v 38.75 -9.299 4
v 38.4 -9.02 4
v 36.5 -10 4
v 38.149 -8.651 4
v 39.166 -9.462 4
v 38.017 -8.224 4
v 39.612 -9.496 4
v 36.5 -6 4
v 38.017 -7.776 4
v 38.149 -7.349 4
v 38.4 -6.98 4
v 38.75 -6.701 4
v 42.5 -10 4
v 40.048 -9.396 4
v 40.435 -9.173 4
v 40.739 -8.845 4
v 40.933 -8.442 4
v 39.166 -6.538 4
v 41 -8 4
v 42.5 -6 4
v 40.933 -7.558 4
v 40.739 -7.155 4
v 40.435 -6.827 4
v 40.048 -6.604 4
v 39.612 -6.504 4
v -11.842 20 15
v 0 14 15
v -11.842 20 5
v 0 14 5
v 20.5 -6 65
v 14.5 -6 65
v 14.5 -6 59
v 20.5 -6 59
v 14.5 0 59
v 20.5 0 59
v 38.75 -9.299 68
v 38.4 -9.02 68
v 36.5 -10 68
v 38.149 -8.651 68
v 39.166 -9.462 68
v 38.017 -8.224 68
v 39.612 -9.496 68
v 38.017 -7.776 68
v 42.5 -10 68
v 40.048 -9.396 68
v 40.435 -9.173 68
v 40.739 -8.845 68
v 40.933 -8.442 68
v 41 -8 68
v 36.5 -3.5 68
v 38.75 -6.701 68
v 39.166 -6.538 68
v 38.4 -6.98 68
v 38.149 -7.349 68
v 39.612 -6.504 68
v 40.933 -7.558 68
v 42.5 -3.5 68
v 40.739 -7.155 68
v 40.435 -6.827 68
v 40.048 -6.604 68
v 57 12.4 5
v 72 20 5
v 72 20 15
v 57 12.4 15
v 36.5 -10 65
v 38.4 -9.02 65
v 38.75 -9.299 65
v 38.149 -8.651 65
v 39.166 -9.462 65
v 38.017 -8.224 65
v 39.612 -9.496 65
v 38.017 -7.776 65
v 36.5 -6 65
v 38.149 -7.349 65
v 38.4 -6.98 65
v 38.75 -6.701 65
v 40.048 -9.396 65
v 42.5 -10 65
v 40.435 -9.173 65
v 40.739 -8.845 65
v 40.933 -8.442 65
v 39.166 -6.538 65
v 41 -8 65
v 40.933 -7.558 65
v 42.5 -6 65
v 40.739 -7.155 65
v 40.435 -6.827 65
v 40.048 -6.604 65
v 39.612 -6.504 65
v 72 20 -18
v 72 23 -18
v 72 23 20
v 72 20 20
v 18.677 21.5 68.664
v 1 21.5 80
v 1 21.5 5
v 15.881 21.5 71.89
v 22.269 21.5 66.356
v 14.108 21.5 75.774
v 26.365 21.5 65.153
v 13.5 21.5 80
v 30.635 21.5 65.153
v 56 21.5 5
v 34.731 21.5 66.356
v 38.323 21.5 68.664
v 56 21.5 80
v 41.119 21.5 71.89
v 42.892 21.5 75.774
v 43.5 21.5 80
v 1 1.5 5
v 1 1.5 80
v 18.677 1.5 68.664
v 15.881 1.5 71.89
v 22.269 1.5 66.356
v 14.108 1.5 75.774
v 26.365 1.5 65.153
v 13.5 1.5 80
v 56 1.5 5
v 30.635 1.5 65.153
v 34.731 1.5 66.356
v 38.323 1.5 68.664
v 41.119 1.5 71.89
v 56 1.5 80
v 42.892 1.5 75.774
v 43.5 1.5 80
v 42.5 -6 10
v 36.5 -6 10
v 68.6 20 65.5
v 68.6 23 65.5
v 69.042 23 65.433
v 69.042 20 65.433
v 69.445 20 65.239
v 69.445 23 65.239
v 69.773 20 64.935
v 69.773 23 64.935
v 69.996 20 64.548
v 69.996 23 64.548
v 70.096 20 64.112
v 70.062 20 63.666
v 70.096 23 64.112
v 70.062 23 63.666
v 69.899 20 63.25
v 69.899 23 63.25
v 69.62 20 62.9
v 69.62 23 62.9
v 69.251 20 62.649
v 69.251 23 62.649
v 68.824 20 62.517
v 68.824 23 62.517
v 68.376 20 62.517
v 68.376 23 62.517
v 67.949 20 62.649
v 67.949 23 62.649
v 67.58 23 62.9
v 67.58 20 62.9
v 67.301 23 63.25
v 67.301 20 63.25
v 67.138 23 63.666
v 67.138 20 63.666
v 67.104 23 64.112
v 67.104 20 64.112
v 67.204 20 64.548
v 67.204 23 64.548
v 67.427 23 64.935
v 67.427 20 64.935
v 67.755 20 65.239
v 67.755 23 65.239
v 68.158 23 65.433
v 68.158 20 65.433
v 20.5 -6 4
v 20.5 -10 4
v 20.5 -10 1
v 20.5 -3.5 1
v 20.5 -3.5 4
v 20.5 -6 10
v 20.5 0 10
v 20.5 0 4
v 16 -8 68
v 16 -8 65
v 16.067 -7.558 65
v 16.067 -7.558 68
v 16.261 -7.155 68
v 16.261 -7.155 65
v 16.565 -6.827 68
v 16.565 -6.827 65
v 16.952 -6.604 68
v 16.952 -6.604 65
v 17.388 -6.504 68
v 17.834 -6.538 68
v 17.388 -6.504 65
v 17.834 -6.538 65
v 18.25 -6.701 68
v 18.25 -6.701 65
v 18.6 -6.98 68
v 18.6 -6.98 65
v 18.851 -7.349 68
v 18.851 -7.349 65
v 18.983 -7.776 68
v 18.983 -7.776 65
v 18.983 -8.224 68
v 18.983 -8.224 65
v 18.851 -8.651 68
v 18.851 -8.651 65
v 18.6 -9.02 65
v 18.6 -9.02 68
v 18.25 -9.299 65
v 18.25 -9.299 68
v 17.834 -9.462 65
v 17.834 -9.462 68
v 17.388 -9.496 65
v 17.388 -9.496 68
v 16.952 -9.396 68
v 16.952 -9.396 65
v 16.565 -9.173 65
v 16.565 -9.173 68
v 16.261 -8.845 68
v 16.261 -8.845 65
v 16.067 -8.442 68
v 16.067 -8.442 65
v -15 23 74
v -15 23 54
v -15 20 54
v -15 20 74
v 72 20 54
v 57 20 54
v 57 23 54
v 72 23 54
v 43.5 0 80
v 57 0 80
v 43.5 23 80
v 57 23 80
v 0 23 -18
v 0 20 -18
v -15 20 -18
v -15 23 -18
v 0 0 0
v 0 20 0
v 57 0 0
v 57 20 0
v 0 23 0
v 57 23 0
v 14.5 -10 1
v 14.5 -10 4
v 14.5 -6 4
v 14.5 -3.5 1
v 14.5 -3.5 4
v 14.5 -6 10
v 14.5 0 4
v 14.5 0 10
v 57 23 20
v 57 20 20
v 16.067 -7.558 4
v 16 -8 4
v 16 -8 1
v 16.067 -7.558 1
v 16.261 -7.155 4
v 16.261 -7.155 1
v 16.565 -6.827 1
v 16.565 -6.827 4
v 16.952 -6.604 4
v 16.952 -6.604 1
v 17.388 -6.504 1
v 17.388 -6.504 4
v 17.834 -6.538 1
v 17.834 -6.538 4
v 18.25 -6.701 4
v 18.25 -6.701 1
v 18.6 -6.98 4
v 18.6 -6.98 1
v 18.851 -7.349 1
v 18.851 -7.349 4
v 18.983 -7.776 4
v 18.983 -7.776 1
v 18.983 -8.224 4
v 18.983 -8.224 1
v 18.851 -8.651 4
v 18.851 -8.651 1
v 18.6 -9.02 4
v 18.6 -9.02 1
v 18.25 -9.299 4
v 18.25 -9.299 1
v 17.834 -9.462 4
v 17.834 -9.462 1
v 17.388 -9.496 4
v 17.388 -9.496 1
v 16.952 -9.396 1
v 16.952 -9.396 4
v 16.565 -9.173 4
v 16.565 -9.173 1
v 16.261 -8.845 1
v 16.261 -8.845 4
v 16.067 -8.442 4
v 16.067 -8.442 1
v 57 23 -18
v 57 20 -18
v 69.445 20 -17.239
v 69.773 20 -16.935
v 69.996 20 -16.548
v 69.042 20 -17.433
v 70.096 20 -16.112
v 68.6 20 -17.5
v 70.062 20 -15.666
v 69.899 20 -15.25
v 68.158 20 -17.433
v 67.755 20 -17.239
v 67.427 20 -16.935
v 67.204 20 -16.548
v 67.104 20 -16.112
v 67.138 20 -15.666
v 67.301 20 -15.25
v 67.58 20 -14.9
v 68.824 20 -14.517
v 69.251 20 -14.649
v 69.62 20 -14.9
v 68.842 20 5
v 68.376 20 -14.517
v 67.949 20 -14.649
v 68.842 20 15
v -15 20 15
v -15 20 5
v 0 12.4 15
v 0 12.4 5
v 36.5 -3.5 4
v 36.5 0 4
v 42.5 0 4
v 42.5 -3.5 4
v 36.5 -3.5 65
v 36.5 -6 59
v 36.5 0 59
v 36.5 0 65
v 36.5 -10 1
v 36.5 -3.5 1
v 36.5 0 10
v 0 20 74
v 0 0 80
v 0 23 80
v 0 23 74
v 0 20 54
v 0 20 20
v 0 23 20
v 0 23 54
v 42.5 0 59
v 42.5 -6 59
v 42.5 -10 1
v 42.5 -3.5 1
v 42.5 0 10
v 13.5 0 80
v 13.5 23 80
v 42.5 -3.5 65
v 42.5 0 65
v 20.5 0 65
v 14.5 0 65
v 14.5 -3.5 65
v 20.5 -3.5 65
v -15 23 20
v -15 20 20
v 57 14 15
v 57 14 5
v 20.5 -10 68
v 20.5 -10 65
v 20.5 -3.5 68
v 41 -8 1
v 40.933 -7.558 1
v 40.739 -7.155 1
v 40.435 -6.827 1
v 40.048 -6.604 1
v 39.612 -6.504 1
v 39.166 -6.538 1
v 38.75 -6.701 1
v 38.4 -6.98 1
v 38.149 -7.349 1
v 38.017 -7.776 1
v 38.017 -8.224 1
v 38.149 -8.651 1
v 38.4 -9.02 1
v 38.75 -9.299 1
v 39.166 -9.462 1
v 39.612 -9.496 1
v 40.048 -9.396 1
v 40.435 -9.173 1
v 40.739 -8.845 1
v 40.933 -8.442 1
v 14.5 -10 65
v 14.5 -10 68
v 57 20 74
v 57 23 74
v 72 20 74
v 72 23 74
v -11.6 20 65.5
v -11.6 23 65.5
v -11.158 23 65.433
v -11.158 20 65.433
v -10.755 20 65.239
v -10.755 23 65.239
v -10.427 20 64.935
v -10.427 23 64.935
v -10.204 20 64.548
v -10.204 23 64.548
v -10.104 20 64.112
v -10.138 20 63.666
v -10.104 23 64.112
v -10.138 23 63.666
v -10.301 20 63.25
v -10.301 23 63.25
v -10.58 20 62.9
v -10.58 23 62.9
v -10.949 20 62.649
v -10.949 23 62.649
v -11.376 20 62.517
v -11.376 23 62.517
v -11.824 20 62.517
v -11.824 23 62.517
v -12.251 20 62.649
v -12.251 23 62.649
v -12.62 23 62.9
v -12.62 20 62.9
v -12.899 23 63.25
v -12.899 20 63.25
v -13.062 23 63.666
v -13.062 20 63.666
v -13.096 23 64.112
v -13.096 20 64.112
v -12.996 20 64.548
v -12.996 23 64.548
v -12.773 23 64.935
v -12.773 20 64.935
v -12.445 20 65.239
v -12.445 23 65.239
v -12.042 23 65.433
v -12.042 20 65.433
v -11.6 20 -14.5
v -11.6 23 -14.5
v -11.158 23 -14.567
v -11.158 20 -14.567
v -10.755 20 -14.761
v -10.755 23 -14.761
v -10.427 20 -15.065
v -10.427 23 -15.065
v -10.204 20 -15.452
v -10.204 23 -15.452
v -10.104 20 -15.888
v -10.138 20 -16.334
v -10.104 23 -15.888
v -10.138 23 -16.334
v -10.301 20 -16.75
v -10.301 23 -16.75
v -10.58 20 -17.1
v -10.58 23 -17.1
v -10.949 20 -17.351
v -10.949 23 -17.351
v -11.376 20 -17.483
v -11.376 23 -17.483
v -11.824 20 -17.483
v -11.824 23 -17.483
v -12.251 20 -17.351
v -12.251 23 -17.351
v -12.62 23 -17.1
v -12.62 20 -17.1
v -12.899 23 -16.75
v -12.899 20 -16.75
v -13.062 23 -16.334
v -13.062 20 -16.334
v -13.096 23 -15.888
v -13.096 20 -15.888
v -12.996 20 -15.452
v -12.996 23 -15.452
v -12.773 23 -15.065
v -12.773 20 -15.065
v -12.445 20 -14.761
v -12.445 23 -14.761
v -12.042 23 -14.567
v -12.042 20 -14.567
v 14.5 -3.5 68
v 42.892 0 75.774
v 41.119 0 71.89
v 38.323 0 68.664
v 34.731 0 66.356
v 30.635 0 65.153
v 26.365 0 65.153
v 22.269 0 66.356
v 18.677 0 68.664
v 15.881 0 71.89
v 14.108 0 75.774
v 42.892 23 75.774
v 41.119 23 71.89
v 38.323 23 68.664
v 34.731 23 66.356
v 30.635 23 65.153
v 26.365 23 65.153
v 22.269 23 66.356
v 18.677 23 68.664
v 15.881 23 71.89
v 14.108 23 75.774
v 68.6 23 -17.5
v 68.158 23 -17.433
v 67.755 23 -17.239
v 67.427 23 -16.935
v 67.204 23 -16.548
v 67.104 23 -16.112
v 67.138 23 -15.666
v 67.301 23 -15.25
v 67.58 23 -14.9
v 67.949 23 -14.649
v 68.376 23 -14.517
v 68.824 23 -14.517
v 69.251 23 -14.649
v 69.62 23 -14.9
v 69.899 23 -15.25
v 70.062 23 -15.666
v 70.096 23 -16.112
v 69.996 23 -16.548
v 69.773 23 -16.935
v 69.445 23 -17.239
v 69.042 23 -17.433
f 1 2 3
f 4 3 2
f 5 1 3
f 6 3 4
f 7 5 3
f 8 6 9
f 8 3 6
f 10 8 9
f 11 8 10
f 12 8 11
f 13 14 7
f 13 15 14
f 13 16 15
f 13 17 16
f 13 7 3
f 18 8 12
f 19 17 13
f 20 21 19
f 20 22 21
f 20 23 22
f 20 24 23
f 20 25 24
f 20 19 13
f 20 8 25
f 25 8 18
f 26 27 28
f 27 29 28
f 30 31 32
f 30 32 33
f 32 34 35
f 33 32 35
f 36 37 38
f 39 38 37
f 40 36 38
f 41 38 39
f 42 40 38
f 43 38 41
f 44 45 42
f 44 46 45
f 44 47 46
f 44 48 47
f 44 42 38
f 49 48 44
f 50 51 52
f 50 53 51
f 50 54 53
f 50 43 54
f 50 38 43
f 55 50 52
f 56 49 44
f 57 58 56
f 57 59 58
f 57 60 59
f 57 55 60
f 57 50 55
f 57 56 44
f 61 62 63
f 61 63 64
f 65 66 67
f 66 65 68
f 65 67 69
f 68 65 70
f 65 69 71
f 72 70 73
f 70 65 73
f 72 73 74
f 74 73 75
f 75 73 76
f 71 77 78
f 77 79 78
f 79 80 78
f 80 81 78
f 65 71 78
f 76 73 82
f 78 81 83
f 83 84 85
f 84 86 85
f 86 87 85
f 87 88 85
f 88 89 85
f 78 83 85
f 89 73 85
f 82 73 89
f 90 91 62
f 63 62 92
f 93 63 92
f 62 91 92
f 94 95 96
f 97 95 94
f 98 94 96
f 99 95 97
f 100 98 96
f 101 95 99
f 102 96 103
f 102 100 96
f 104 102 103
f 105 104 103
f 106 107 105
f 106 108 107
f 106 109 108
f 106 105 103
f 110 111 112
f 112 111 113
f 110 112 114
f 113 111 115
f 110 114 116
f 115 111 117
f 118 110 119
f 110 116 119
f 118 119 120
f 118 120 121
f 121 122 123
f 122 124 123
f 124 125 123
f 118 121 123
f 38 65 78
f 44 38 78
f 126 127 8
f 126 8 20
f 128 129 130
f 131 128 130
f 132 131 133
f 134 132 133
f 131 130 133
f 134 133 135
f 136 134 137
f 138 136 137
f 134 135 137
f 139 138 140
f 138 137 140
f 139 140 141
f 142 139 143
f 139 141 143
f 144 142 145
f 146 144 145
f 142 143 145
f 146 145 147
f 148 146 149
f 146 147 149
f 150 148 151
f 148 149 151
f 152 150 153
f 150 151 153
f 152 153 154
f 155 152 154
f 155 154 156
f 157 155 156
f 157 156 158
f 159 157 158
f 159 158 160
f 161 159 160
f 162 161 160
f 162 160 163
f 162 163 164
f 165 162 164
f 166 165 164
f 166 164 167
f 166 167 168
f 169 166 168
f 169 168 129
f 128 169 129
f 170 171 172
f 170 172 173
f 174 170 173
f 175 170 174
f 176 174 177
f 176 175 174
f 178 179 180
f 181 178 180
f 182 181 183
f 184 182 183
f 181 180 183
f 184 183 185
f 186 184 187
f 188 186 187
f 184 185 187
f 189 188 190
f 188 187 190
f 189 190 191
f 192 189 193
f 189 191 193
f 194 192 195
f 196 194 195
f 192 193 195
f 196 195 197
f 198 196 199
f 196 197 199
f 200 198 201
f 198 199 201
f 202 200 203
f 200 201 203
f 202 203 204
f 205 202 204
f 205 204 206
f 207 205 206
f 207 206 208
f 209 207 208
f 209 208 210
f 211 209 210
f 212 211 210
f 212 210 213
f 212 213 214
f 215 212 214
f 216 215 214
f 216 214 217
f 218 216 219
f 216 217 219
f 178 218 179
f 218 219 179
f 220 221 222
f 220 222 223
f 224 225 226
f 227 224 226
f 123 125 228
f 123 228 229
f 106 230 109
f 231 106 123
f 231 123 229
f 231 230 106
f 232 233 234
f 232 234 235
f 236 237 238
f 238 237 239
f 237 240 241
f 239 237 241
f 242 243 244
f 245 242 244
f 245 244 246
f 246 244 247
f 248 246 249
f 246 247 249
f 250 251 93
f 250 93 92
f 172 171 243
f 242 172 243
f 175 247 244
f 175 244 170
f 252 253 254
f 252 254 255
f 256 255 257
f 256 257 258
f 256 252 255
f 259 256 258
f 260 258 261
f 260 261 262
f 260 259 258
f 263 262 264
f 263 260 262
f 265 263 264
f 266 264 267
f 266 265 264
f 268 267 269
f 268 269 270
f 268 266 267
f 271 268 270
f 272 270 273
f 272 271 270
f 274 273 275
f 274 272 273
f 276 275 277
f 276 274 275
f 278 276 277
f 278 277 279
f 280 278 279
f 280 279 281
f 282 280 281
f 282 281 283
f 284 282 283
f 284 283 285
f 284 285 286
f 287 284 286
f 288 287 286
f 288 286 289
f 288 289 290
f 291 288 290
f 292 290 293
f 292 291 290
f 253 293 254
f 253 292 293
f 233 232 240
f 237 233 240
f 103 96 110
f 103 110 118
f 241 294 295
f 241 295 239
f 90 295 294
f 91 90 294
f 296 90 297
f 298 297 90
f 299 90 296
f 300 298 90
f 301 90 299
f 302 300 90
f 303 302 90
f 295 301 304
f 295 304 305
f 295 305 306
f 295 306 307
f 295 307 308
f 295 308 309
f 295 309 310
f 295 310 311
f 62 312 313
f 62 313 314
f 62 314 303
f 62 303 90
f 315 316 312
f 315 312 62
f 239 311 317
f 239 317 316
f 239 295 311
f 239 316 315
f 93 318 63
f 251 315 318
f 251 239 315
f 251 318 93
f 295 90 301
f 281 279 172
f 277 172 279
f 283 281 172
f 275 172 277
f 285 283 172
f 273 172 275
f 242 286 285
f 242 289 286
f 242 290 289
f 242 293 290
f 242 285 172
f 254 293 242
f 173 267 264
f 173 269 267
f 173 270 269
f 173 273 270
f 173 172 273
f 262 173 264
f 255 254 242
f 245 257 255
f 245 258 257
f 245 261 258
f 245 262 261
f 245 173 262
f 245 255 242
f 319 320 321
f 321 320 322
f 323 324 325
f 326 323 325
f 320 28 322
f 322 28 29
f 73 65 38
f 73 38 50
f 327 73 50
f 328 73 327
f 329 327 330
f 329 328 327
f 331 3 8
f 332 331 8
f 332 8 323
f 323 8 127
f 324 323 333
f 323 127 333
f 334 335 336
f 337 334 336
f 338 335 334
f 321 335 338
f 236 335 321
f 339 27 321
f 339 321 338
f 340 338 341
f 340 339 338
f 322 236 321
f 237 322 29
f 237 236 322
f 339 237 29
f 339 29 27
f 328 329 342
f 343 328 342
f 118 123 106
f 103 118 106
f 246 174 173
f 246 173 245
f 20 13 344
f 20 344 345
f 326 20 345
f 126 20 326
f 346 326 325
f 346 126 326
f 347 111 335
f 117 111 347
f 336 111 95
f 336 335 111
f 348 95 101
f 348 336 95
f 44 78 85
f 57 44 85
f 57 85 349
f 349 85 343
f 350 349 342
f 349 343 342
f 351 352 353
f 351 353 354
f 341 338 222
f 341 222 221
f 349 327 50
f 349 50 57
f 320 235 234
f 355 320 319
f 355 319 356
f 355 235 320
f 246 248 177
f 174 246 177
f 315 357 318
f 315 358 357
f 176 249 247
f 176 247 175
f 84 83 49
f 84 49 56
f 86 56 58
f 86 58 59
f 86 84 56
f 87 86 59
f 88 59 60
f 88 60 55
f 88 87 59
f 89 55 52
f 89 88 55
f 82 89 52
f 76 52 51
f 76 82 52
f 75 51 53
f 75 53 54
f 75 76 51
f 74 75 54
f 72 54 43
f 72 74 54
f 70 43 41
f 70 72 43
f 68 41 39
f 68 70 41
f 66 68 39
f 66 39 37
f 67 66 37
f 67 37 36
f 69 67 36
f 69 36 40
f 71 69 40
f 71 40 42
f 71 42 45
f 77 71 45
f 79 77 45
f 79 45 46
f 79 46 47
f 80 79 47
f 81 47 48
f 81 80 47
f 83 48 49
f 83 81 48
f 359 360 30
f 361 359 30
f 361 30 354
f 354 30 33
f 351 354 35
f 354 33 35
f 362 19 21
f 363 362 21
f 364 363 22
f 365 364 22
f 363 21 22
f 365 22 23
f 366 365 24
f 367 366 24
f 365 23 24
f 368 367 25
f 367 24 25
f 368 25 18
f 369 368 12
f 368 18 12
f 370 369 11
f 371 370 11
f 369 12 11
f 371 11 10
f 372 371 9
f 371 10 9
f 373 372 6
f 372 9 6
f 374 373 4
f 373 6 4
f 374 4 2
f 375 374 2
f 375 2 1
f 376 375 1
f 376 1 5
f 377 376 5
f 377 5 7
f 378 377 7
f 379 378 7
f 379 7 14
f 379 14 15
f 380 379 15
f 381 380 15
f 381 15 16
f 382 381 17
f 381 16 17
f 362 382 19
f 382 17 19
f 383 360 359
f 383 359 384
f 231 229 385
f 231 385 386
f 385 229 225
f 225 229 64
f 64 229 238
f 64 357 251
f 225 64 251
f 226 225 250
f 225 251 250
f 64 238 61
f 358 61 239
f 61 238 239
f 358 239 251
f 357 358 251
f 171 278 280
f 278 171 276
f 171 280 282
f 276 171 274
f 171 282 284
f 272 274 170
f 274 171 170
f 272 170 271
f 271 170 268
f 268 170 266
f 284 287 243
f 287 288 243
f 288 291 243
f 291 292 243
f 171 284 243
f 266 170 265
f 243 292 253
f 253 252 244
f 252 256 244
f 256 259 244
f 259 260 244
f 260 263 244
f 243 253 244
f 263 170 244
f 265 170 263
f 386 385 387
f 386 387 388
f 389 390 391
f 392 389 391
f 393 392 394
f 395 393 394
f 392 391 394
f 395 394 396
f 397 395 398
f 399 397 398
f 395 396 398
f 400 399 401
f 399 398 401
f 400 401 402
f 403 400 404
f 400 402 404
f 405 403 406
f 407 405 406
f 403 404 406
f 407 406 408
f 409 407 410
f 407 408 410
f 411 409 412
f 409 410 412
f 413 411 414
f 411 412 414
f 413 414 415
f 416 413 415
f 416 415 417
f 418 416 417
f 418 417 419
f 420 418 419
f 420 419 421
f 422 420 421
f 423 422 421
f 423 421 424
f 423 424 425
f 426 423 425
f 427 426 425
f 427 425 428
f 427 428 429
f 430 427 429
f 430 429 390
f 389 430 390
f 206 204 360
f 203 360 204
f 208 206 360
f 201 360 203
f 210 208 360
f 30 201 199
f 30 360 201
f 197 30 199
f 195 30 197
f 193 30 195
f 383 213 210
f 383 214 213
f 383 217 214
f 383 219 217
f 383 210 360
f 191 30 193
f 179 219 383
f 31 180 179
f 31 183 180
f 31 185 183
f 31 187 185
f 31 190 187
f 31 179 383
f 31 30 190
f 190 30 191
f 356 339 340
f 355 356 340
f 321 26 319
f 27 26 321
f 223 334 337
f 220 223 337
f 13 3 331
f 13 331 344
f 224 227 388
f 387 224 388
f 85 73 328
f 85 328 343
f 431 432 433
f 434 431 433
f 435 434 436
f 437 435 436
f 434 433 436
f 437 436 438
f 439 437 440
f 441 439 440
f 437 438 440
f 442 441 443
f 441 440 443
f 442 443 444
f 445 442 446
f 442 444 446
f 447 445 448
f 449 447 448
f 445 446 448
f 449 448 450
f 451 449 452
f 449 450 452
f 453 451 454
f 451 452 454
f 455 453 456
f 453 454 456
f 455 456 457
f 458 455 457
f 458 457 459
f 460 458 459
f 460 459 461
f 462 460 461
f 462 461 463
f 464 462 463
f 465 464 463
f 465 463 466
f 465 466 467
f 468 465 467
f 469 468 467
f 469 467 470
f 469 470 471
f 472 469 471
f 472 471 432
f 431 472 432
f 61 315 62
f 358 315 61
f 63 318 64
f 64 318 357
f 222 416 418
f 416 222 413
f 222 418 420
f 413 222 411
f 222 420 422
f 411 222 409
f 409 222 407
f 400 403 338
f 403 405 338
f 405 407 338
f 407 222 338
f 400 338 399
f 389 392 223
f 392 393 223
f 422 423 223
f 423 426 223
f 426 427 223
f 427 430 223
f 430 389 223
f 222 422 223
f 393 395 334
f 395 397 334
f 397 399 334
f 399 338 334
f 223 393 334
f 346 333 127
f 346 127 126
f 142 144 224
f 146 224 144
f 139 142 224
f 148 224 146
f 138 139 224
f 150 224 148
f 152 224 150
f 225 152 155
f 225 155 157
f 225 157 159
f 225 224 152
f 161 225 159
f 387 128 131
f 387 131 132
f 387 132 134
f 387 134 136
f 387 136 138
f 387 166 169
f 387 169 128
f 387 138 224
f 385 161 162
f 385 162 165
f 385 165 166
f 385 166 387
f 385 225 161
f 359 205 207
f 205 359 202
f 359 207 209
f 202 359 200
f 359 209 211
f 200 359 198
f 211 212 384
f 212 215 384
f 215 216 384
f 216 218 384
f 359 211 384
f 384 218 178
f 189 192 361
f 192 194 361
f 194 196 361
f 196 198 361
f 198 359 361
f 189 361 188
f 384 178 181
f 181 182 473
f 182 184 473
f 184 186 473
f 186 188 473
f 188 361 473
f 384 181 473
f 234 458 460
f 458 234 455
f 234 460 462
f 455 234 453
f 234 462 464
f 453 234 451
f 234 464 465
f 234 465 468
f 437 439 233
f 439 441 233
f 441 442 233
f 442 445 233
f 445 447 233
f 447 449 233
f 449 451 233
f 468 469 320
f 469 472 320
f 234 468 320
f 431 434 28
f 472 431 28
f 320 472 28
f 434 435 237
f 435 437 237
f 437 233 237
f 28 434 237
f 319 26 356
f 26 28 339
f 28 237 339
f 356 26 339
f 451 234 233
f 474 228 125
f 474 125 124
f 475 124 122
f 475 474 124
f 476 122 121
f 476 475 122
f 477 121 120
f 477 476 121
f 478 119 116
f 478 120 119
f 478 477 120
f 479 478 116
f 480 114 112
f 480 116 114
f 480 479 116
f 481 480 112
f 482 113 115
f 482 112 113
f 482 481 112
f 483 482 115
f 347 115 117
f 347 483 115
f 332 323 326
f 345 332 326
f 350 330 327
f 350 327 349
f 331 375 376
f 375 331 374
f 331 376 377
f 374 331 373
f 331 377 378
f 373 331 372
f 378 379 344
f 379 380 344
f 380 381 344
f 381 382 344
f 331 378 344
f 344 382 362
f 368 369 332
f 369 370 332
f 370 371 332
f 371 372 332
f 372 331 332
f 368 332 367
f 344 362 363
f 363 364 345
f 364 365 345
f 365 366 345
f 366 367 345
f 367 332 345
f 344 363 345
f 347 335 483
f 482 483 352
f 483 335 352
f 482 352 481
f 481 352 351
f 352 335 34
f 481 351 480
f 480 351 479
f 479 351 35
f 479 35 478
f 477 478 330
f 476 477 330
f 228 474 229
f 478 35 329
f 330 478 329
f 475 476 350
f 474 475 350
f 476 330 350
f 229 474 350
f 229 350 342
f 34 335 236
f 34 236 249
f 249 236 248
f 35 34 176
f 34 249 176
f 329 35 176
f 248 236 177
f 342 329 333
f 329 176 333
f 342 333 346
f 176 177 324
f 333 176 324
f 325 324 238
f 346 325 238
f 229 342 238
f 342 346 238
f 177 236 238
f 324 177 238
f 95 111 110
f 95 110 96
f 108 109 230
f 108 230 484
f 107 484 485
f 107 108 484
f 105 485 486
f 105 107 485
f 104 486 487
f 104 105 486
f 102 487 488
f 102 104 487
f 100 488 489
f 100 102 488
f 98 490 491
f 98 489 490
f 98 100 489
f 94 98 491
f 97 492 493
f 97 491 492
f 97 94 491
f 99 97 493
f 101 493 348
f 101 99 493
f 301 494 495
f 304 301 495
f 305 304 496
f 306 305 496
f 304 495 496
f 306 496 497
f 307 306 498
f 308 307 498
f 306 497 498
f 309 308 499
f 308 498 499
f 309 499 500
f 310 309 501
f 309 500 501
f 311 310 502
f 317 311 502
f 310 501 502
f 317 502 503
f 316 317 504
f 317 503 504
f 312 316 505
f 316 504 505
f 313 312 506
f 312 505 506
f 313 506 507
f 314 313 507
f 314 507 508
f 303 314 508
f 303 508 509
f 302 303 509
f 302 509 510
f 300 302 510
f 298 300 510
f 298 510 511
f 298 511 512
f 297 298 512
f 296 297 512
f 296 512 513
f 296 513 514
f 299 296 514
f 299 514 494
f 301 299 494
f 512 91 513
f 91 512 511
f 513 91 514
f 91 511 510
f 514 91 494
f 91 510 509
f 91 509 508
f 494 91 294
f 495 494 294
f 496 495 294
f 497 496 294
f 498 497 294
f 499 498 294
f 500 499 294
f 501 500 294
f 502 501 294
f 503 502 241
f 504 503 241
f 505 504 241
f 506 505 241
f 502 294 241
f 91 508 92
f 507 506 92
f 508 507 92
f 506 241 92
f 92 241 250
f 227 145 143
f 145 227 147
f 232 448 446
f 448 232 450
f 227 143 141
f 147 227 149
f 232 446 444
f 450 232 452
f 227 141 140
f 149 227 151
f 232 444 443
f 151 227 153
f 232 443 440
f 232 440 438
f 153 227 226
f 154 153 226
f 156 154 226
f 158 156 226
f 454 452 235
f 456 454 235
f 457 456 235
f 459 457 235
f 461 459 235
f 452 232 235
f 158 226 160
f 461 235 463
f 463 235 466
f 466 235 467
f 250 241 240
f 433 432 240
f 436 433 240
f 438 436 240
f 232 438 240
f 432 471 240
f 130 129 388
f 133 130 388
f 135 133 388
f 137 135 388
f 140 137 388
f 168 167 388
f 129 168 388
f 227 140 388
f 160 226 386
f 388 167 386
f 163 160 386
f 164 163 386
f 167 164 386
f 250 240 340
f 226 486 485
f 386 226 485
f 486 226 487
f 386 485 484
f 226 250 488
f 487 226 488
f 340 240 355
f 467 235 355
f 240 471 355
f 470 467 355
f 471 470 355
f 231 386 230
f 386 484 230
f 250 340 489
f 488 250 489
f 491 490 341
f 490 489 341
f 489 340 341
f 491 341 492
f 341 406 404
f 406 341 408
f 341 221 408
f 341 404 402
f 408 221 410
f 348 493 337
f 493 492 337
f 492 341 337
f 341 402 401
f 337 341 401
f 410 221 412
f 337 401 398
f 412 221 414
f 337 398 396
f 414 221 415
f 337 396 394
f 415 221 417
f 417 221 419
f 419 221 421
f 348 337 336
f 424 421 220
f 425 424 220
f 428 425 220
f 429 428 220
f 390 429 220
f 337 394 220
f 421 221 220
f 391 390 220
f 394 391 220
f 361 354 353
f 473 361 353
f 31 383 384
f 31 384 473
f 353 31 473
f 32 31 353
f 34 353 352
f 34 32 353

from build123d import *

# Parameters (mm, degrees)
SKETCH_1_W               = 57
SKETCH_1_H               = 23
EXTRUDE_1_DEPTH          = 80
SKETCH_2_W               = 55
SKETCH_2_H               = 20
CUT_EXTRUDE_1_DEPTH      = 75
SKETCH_3_W               = 6
SKETCH_3_H               = 6
EXTRUDE_2_DEPTH          = 6
SKETCH_4_W               = 6
SKETCH_4_H               = 6.5
SKETCH_4_R               = 1.5
EXTRUDE_3_DEPTH          = 3
MIRROR_2_COPY_1_SKETCH_W = 6
MIRROR_2_COPY_1_SKETCH_H = 6.5
MIRROR_2_COPY_1_SKETCH_R = 1.5
MIRROR_2_COPY_1_DEPTH    = 3
CUT_EXTRUDE_3_DEPTH      = 104.624321469
CUT_EXTRUDE_3_DEPTH_BACK = 25
SKETCH_6_W               = 38
SKETCH_6_H               = 3
SKETCH_6_W_2             = 20
EXTRUDE_4_DEPTH          = 15
SKETCH_8_R               = 1.5
CUT_EXTRUDE_4_DEPTH      = 113.57441983
EXTRUDE_5_DEPTH          = 5


with BuildPart() as part:
    # 草图1 → 凸台-拉伸1 (new body)
    with BuildSketch(Plane.XY):
        with Locations((28.5, 11.5)):
            Rectangle(SKETCH_1_W, SKETCH_1_H)
    extrude(amount=EXTRUDE_1_DEPTH)

    # 草图2 → 切除-拉伸1 (cut)
    with BuildSketch(Plane.XY.offset(80)):
        with Locations((28.5, 11.5)):
            Rectangle(SKETCH_2_W, SKETCH_2_H)
    extrude(amount=-CUT_EXTRUDE_1_DEPTH, mode=Mode.SUBTRACT)

    # 草图3 → 凸台-拉伸2 (add)
    with BuildSketch(Plane.XZ):
        with Locations((17.5, 62)):
            Rectangle(SKETCH_3_W, SKETCH_3_H)
        with Locations((17.5, 7)):
            Rectangle(SKETCH_3_W, SKETCH_3_H)
        with Locations((39.5, 7)):
            Rectangle(SKETCH_3_W, SKETCH_3_H)
        with Locations((39.5, 62)):
            Rectangle(SKETCH_3_W, SKETCH_3_H)
    extrude(amount=EXTRUDE_2_DEPTH)

    # 草图4 → 凸台-拉伸3 (add)
    with BuildSketch(Plane.XY.offset(65)):
        with Locations((39.5, -6.75)):
            Rectangle(SKETCH_4_W, SKETCH_4_H)
        with Locations((39.5, -8)):
            Circle(SKETCH_4_R, mode=Mode.SUBTRACT)
    extrude_3 = extrude(amount=EXTRUDE_3_DEPTH)

    # 镜向1: 凸台-拉伸3 across plane
    add(extrude_3.mirror(Plane.XY.offset(34.5)))

    # 镜向2: 凸台-拉伸3 across plane
    add(extrude_3.mirror(Plane.ZY.offset(-28.5)))

    # 镜向2 copy 1 sketch → 镜向2 copy 1 (add)
    with BuildSketch(Plane(origin=(57, 0, 4), x_dir=(-1, 0, 0), z_dir=(0, 0, -1))):
        with Locations((39.5, -6.75)):
            Rectangle(MIRROR_2_COPY_1_SKETCH_W, MIRROR_2_COPY_1_SKETCH_H)
        with Locations((39.5, -8)):
            Circle(MIRROR_2_COPY_1_SKETCH_R, mode=Mode.SUBTRACT)
    extrude(amount=MIRROR_2_COPY_1_DEPTH)

    # 草图5 → 切除-拉伸3 (cut, two sides: drawn at the far end of the back side and taken through both)
    with BuildSketch(Plane(origin=(0, 23, 0), x_dir=(1, 0, 0), z_dir=(0, 1, 0)).offset(-CUT_EXTRUDE_3_DEPTH_BACK)):
        with BuildLine():
            Line((43.5, -272.123584415), (43.5, -80))
            ThreePointArc((43.5, -80), (28.5, -65), (13.5, -80))
            Line((13.5, -80), (13.5, -272.123584415))
            Line((13.5, -272.123584415), (13.5, -656.370753244))
            Line((13.5, -656.370753244), (43.5, -656.370753244))
            Line((43.5, -656.370753244), (43.5, -272.123584415))
        make_face()
    extrude(amount=CUT_EXTRUDE_3_DEPTH + CUT_EXTRUDE_3_DEPTH_BACK, mode=Mode.SUBTRACT)

    # 草图6 → 凸台-拉伸4 (add)
    with BuildSketch(Plane.ZY):
        with Locations((1, 21.5)):
            Rectangle(SKETCH_6_W, SKETCH_6_H)
        with Locations((64, 21.5)):
            Rectangle(SKETCH_6_W_2, SKETCH_6_H)
    extrude_4 = extrude(amount=EXTRUDE_4_DEPTH)

    # 镜向3: 凸台-拉伸4 across plane
    add(extrude_4.mirror(Plane.ZY.offset(-28.5)))

    # 草图8 → 切除-拉伸4 (cut, through all)
    with BuildSketch(Plane(origin=(0, 23, 0), x_dir=(1, 0, 0), z_dir=(0, 1, 0))):
        with Locations(Location((-11.6, 16, 0), (0, 0, 270))):
            Circle(SKETCH_8_R)
        with Locations(Location((68.6, 16, 0), (0, 0, 90))):
            Circle(SKETCH_8_R)
        with Locations(Location((-11.6, -64, 0), (0, 0, 270))):
            Circle(SKETCH_8_R)
        with Locations(Location((68.6, -64, 0), (0, 0, 270))):
            Circle(SKETCH_8_R)
    extrude(amount=-CUT_EXTRUDE_4_DEPTH, mode=Mode.SUBTRACT)

    # 草图12 → 凸台-拉伸5 (add, symmetric)
    with BuildSketch(Plane(origin=(0, 0, 10), x_dir=(-1, 0, 0), z_dir=(0, 0, -1))):
        Polygon((15, 20), (0, 12.4), (0, 14), (11.842105263, 20), align=None)
    extrude_5 = extrude(amount=EXTRUDE_5_DEPTH, both=True)

    # 镜向4: 凸台-拉伸5 across plane
    add(extrude_5.mirror(Plane.ZY.offset(-28.5)))


solid = part.part
